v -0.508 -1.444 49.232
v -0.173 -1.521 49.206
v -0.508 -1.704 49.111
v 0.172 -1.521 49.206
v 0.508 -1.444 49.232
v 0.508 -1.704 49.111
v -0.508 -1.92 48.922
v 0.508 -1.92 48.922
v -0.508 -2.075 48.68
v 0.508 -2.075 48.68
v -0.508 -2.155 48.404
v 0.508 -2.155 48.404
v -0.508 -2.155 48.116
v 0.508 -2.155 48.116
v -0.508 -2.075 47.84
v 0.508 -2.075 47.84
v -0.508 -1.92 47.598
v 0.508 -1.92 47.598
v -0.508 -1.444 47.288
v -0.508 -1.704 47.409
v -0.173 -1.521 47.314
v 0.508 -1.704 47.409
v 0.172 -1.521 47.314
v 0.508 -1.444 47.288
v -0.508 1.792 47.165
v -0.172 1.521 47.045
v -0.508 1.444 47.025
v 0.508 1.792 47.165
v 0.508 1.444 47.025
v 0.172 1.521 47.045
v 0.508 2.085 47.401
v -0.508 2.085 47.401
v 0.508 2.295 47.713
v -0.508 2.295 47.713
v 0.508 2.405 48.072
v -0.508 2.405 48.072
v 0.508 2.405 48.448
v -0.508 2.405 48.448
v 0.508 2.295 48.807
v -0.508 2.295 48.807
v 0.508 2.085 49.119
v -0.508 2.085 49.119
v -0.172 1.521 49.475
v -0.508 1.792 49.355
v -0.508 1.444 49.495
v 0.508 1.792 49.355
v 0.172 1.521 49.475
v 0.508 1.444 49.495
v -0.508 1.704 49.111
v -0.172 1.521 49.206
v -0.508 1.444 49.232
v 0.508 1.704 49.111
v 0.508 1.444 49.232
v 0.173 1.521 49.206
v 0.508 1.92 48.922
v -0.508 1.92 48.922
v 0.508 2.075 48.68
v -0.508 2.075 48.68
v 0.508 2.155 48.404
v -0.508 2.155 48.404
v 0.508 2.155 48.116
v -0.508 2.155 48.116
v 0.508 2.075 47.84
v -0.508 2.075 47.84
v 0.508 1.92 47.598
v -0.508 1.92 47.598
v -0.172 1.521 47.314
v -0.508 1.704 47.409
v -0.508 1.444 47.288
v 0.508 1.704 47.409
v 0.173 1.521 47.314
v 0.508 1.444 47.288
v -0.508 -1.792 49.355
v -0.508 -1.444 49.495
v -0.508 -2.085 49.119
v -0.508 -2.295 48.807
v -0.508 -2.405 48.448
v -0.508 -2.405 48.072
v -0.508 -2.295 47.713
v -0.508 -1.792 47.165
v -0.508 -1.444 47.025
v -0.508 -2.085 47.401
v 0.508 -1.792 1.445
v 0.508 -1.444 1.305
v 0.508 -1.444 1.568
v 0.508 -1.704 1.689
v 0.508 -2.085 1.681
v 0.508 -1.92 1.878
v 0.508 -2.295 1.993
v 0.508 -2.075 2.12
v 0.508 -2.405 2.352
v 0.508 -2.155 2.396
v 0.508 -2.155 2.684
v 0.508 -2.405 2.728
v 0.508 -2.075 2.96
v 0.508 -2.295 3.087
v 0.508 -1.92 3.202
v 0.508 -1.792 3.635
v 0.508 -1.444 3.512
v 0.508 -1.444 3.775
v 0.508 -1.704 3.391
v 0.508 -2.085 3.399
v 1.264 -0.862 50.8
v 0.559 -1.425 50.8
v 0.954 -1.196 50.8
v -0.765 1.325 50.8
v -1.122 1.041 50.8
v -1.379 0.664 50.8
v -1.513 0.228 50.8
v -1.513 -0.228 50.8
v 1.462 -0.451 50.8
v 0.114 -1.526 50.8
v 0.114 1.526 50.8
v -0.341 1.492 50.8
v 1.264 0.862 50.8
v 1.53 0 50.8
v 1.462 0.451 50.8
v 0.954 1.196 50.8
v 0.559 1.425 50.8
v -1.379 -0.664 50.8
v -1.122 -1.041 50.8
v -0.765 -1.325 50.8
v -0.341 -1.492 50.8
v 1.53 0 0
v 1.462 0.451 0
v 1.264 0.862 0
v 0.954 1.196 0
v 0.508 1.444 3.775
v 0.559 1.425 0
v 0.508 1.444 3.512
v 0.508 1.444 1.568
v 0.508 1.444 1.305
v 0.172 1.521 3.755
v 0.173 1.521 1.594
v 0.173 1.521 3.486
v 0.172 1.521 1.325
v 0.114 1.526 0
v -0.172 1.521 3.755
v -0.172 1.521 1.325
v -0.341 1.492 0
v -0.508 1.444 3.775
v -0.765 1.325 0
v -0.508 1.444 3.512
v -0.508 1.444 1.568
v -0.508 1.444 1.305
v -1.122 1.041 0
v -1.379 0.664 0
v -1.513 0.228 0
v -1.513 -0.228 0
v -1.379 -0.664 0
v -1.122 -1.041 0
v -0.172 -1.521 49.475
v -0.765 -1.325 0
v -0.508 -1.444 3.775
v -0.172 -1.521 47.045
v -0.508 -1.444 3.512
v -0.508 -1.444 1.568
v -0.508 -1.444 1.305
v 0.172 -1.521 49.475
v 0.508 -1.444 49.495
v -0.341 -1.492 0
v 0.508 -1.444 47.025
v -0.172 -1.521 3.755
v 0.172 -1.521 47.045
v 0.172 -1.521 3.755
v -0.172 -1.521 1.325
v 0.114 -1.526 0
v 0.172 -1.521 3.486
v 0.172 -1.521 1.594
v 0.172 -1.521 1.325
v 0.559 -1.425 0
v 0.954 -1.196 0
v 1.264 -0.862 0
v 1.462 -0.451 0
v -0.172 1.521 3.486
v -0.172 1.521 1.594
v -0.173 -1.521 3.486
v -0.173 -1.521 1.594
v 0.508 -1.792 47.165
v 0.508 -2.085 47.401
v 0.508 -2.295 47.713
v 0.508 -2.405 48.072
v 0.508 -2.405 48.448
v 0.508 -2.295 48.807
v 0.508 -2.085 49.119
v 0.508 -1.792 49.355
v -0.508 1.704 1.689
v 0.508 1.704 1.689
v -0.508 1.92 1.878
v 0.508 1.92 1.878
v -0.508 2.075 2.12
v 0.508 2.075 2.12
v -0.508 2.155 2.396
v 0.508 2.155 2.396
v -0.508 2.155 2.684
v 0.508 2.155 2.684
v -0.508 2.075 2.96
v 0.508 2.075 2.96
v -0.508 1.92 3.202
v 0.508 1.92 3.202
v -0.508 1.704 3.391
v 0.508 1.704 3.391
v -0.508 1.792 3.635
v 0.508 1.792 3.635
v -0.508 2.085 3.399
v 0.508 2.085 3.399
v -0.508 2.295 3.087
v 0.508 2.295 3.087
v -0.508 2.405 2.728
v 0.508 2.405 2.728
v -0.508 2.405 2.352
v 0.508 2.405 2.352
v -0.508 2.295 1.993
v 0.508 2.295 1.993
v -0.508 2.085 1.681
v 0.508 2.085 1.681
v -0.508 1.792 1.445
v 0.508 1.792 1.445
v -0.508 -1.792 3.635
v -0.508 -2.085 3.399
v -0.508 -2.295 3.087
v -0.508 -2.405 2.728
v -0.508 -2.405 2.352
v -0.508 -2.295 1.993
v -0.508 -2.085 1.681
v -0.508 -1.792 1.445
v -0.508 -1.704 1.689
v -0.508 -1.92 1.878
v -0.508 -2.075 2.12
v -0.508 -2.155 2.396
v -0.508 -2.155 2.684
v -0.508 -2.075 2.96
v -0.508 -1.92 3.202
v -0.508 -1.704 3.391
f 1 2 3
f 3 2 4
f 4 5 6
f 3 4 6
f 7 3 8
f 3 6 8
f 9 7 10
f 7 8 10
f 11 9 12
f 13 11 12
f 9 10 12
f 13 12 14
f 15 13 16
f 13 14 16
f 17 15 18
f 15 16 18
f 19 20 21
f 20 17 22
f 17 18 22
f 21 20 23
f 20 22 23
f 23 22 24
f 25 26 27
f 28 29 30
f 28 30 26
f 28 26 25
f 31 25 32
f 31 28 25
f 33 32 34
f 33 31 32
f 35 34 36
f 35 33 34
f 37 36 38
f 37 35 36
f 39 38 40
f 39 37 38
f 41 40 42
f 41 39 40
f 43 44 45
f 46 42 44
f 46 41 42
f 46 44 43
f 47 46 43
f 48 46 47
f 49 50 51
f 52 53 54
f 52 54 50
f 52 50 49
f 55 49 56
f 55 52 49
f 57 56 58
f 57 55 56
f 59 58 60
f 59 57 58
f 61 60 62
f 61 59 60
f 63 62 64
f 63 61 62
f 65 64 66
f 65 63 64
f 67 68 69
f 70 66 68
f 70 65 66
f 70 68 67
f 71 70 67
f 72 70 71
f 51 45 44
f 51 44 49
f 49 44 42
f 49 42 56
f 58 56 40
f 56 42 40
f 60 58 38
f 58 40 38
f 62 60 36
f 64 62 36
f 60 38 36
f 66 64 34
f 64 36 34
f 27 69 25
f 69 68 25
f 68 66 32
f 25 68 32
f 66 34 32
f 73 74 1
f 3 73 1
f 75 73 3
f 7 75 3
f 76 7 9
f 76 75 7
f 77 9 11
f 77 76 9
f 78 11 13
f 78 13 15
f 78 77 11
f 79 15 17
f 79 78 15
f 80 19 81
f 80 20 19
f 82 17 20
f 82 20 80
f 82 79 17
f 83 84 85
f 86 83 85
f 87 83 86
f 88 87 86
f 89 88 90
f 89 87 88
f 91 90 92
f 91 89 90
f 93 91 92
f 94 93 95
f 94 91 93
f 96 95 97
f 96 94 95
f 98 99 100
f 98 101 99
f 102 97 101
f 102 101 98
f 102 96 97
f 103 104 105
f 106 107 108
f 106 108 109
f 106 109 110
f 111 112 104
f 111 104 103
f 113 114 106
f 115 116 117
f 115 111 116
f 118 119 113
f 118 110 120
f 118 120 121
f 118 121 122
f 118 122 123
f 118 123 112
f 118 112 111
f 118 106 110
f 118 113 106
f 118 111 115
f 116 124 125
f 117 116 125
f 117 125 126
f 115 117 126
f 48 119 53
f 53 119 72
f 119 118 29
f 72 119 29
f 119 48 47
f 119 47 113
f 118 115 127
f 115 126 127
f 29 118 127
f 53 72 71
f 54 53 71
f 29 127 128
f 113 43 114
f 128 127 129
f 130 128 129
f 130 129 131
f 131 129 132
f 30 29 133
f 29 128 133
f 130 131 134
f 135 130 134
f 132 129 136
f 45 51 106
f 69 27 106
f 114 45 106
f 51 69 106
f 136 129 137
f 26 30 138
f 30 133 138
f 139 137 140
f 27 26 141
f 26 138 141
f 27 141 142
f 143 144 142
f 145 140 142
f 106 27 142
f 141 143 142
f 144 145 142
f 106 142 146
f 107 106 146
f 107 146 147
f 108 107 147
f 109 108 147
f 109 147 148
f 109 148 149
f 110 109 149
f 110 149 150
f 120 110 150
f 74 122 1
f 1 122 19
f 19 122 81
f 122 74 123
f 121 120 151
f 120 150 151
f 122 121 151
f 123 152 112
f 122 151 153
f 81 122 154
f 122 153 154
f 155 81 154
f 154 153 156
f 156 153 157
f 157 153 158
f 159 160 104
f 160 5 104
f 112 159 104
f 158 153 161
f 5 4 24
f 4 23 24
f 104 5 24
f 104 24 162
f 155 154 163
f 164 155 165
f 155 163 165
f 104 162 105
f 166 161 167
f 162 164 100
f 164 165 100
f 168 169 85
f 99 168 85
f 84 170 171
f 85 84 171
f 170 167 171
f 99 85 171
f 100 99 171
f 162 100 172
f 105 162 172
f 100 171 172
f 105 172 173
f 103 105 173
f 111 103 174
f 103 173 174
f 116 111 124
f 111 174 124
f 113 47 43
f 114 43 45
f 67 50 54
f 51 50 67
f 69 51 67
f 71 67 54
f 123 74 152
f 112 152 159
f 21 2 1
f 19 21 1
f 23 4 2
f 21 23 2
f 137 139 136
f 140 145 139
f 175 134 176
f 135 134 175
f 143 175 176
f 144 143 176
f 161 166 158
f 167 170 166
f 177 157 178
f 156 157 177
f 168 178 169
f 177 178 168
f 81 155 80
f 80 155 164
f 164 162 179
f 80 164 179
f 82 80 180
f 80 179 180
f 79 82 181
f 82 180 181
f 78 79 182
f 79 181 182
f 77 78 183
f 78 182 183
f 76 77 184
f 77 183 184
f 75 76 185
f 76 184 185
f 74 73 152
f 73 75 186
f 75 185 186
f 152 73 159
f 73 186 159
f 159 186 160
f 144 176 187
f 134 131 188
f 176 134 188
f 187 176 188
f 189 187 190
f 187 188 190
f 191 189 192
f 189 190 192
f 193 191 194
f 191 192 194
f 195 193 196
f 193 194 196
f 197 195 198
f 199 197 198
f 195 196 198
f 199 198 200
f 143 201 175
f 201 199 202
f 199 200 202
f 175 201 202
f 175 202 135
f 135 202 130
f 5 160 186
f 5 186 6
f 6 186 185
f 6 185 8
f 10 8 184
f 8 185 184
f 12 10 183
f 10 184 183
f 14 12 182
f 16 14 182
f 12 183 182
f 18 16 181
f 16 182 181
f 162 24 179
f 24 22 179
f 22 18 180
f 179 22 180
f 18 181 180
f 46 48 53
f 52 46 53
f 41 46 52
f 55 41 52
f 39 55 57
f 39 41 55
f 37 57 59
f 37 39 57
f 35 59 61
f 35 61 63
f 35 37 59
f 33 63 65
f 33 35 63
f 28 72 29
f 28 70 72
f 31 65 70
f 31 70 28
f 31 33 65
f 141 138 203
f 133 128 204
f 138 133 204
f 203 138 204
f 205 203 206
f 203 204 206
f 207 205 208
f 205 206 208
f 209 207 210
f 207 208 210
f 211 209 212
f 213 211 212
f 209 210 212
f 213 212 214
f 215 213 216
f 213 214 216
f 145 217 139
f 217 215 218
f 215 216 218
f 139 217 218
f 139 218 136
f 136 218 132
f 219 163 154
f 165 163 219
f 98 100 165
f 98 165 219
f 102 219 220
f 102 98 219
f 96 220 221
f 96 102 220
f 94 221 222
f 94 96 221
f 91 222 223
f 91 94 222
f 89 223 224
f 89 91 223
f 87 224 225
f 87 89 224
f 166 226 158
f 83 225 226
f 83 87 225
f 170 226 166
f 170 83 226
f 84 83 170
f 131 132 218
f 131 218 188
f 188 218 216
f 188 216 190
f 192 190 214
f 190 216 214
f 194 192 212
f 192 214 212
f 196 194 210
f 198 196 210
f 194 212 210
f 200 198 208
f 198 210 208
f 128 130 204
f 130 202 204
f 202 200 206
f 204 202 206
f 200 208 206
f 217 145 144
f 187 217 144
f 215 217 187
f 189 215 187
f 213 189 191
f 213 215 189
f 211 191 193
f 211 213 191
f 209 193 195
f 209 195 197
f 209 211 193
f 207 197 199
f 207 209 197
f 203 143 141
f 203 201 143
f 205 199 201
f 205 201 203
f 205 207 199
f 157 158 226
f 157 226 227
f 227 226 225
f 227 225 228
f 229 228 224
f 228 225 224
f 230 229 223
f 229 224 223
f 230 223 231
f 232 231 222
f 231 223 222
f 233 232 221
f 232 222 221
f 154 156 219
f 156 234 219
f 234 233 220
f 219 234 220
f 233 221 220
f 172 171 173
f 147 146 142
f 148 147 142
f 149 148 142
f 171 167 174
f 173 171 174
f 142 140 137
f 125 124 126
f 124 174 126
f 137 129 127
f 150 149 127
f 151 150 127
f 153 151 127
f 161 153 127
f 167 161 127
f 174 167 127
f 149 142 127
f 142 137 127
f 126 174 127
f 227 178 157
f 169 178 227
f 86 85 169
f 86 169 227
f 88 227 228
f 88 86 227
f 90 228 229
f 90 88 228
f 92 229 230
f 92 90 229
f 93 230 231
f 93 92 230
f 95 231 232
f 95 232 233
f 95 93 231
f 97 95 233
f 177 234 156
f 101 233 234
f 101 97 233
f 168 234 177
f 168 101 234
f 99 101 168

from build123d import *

# Parameters (mm, degrees)
SKETCH1_R            = 1.53035
BOSS_EXTRUDE1_DEPTH  = 50.8
BOSS_EXTRUDE2_DEPTH  = 0.508
MIRROR2_COPY_1_DEPTH = 0.508


with BuildPart() as part:
    # Sketch1 → Boss-Extrude1 (new body)
    with BuildSketch(Plane.XY):
        Circle(SKETCH1_R)
    extrude(amount=BOSS_EXTRUDE1_DEPTH)

    # Sketch2 → Boss-Extrude2 (add, symmetric)
    with BuildSketch(Plane(origin=(0, 0, 0), x_dir=(0, 0, -1), z_dir=(1, 0, 0))):
        with BuildLine():
            ThreePointArc((-46.99, 1.14935), (-48.26, 2.41935), (-49.53, 1.14935))
            Line((-49.53, 1.14935), (-49.276, 1.14935))
            ThreePointArc((-49.276, 1.14935), (-48.26, 2.16535), (-47.244, 1.14935))
            Line((-47.244, 1.14935), (-46.99, 1.14935))
        make_face()
    boss_extrude2 = extrude(amount=BOSS_EXTRUDE2_DEPTH, both=True)

    # Mirror1: Boss-Extrude2 across plane
    add(boss_extrude2.mirror(Plane.ZX))

    # Mirror2: Boss-Extrude2 across plane
    add(boss_extrude2.mirror(Plane(origin=(0, 0, 25.4), x_dir=(1, 0, 0), z_dir=(0, 0, -1))))

    # Mirror2 copy 1 sketch → Mirror2 copy 1 (add, symmetric)
    with BuildSketch(Plane(origin=(0, 0, 50.8), x_dir=(0, 0, 1), z_dir=(1, 0, 0))):
        with BuildLine():
            ThreePointArc((-46.99, 1.14935), (-48.26, 2.41935), (-49.53, 1.14935))
            Line((-49.53, 1.14935), (-49.276, 1.14935))
            ThreePointArc((-49.276, 1.14935), (-48.26, 2.16535), (-47.244, 1.14935))
            Line((-47.244, 1.14935), (-46.99, 1.14935))
        make_face()
    extrude(amount=MIRROR2_COPY_1_DEPTH, both=True)


solid = part.part
